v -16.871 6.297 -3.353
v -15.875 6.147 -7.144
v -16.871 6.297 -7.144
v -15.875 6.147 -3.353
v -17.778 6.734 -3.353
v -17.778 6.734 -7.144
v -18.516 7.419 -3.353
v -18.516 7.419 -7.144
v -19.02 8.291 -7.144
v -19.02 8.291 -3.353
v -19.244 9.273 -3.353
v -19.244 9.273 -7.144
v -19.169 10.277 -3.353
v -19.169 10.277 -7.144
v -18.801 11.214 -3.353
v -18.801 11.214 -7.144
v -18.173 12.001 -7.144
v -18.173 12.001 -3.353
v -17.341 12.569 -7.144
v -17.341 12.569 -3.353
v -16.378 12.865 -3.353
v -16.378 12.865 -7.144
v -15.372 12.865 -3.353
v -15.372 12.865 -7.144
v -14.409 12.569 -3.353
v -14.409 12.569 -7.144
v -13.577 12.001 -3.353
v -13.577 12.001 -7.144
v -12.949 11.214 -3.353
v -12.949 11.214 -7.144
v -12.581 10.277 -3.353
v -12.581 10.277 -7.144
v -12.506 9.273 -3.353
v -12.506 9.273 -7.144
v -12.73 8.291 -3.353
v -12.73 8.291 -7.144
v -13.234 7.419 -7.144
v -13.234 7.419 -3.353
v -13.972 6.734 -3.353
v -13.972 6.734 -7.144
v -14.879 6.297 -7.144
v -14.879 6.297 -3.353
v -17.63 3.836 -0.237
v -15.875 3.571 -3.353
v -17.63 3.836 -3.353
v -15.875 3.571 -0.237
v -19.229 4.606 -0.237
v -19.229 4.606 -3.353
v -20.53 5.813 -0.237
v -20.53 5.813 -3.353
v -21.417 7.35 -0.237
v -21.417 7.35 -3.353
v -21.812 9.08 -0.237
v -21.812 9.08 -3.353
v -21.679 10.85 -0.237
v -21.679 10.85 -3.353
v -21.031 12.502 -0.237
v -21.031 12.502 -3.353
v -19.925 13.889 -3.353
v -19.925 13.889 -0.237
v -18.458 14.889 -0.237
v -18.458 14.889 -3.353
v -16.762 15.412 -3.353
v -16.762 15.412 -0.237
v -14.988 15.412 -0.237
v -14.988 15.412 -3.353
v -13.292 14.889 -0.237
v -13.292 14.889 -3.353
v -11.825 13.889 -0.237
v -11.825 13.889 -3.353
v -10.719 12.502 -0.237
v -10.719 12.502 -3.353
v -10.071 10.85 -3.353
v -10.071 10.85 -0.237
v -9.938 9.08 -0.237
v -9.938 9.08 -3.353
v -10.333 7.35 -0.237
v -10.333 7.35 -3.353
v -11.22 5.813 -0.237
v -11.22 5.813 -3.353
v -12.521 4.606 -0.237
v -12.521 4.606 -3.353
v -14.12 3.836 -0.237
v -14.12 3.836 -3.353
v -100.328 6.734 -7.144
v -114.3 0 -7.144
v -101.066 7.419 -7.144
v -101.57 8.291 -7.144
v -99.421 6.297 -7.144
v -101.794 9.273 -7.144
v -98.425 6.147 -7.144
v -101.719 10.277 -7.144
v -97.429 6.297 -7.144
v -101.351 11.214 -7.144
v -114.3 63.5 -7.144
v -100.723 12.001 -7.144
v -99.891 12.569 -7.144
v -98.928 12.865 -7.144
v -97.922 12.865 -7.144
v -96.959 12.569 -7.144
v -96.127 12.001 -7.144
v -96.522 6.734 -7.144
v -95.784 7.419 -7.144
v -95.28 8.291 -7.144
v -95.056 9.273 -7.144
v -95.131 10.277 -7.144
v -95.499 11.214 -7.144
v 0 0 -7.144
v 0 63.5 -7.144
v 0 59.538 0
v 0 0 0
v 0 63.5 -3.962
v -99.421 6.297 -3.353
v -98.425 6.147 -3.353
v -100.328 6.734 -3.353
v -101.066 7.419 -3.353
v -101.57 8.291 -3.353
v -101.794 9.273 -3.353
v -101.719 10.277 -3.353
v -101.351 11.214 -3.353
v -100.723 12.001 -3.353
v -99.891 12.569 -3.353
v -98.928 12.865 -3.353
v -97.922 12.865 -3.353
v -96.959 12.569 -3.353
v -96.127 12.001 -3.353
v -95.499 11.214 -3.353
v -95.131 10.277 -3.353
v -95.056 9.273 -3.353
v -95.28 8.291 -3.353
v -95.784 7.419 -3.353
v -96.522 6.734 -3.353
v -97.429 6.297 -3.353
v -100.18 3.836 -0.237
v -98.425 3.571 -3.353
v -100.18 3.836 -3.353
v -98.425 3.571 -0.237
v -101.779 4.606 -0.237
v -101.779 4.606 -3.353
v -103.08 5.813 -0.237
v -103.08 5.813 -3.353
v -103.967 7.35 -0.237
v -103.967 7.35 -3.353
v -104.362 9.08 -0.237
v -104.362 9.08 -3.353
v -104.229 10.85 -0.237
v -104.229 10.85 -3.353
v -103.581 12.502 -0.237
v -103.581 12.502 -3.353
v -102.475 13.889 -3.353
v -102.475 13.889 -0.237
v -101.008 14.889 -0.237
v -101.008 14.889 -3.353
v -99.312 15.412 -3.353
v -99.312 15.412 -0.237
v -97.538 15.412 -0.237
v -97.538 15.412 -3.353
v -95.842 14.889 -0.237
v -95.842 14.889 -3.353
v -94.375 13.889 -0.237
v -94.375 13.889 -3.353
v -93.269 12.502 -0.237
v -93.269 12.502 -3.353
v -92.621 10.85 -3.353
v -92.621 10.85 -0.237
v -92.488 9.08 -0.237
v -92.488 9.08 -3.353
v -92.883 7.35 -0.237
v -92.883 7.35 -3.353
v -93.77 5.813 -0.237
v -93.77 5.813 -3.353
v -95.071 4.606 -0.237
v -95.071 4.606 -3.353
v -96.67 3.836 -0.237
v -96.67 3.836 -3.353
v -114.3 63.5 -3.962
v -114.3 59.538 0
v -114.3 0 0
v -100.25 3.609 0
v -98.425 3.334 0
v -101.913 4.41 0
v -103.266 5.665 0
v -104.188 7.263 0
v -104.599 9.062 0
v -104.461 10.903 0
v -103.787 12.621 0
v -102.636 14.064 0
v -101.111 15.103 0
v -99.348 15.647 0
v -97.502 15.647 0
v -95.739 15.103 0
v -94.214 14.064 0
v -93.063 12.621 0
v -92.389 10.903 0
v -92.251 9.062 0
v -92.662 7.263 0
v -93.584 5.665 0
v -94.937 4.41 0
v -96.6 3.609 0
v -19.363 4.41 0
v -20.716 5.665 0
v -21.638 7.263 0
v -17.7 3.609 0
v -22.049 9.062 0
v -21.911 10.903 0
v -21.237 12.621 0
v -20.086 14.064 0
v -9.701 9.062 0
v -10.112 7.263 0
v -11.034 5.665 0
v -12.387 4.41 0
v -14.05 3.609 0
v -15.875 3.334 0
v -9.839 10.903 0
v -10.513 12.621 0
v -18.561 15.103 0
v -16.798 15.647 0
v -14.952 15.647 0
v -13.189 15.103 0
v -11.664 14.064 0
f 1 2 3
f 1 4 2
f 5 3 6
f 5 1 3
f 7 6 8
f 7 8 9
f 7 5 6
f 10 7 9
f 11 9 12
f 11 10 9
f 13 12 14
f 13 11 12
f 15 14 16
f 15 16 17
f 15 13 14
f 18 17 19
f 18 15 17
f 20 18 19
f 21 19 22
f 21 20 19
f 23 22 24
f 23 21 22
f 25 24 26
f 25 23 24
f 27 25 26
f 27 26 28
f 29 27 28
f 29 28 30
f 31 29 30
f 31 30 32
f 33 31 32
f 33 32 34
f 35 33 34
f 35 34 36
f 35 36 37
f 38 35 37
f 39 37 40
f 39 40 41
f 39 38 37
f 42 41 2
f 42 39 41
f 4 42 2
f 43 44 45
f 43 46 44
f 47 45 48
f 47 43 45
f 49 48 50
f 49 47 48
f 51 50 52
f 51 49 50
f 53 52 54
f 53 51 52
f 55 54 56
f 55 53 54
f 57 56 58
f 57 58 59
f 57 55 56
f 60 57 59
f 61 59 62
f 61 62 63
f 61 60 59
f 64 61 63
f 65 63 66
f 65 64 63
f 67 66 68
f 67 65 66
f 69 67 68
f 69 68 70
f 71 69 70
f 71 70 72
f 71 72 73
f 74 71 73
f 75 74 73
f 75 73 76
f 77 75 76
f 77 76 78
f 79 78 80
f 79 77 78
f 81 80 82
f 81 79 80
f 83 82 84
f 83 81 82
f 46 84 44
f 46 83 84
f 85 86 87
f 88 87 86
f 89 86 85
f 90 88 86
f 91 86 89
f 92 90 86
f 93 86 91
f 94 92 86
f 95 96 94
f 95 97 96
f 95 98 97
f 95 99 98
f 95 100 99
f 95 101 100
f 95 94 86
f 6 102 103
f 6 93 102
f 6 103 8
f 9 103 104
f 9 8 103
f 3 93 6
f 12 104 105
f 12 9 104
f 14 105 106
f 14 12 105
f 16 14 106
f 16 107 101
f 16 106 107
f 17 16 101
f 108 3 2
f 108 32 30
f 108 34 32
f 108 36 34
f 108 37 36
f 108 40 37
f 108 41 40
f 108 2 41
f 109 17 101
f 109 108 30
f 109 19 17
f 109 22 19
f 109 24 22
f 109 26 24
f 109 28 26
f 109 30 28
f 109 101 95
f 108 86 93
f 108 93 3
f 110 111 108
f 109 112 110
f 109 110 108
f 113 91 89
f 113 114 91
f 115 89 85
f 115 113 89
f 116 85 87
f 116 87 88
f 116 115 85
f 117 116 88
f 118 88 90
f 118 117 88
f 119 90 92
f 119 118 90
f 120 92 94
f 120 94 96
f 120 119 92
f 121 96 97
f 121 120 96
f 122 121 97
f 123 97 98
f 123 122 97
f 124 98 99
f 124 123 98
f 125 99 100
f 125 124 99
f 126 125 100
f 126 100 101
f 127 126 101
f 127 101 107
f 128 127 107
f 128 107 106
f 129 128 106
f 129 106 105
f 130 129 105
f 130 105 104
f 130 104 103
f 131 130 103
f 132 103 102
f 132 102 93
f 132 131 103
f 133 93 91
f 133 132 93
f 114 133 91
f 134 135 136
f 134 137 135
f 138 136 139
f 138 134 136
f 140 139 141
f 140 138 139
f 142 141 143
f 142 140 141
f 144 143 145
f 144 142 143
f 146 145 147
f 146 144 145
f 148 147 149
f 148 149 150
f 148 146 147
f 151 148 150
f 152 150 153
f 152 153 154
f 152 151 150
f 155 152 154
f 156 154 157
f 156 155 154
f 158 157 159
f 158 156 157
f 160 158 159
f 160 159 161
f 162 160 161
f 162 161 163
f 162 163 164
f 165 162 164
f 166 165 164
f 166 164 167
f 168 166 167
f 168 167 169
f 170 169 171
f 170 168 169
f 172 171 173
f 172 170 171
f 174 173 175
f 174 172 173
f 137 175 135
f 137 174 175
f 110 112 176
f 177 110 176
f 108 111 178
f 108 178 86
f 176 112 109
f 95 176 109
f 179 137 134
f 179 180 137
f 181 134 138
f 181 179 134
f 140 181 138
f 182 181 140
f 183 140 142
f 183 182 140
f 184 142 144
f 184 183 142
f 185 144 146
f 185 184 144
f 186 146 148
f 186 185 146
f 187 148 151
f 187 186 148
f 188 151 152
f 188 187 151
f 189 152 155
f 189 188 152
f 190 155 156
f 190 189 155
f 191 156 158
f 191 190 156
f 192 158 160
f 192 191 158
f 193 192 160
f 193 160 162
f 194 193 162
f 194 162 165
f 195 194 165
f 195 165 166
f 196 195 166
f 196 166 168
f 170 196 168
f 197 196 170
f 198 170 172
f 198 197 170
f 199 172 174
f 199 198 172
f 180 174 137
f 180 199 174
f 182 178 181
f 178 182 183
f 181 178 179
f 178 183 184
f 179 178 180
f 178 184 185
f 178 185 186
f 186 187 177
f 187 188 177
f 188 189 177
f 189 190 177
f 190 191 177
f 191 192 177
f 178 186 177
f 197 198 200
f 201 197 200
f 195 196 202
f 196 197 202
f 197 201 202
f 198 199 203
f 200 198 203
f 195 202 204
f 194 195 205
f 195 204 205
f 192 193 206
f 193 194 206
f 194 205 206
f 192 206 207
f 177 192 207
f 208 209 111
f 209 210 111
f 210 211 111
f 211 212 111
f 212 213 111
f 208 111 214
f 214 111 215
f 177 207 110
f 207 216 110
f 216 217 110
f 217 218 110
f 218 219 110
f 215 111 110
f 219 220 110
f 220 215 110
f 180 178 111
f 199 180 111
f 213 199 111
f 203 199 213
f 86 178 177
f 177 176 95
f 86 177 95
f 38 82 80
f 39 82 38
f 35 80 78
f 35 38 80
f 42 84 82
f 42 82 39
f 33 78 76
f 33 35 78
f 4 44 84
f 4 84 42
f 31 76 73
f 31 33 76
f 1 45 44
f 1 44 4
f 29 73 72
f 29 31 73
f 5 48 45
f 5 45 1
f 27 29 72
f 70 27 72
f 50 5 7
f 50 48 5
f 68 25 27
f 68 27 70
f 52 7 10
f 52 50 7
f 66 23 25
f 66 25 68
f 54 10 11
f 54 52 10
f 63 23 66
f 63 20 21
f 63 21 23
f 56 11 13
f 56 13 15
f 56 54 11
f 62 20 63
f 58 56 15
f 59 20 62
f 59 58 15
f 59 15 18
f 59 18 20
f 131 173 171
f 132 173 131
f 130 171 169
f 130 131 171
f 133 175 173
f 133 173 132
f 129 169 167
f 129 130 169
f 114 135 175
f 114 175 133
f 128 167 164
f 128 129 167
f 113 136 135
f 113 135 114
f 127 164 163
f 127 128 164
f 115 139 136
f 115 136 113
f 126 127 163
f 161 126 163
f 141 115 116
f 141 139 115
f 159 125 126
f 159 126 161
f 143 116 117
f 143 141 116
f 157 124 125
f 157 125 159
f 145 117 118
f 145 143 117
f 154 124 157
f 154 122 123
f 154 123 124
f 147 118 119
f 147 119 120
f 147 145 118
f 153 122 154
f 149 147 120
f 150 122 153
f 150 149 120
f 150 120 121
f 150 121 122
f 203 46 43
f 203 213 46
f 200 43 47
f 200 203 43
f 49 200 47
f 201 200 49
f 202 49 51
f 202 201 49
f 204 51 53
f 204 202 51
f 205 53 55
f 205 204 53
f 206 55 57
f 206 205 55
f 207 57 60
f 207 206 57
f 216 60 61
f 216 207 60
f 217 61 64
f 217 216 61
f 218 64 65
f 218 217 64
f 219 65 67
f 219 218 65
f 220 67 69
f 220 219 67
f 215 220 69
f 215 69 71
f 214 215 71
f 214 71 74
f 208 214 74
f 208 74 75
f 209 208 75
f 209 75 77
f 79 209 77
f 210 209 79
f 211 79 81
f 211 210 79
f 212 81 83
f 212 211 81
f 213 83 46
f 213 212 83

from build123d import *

# Parameters (mm, degrees)
SKETCH2_W                                     = 7.14375
SKETCH2_H                                     = 63.5
BOSS_EXTRUDE1_DEPTH                           = 114.3
CBORE_FOR_1_4_BUTTON_HEAD_CAP_SCREW1_AT_COUNT = 2
CBORE_FOR_1_4_BUTTON_HEAD_CAP_SCREW1_AT_PITCH = 82.55
CHAMFER1_SIZE                                 = 3.9624


with BuildPart() as part:
    # Sketch2 → Boss-Extrude1 (new body)
    with BuildSketch(Plane(origin=(0, 0, 0), x_dir=(0, 0, -1), z_dir=(1, 0, 0))):
        with Locations((3.571875, 31.75)):
            Rectangle(SKETCH2_W, SKETCH2_H)
    extrude(amount=-BOSS_EXTRUDE1_DEPTH)

    # Sketch3 → CBORE for 1/4 Button Head Cap Screw1 (revolve, cut)
    with BuildSketch(Plane(origin=(-98.425, 9.525, 0), x_dir=(0, -1, 0), z_dir=(1, 0, 0))):
        Polygon((0, 0), (0, 7.14375), (3.3782, 7.14375), (3.3782, 3.3528), (5.95376, 3.3528), (5.95376, 0.23749), (6.19125, 0), align=None)
    cbore_for_1_4_button_head_cap_screw1 = revolve(axis=Axis((-98.425, 9.525, 6.35), (0, 0, -1)), mode=Mode.SUBTRACT)

    # CBORE for 1/4 Button Head Cap Screw1 at: CBORE for 1/4 Button Head Cap Screw1 ×2
    with Locations(*[(i * CBORE_FOR_1_4_BUTTON_HEAD_CAP_SCREW1_AT_PITCH, 0, 0) for i in range(1, CBORE_FOR_1_4_BUTTON_HEAD_CAP_SCREW1_AT_COUNT)]):
        add(cbore_for_1_4_button_head_cap_screw1, mode=Mode.SUBTRACT)

    # Chamfer1
    chamfer1_edges = [part.edges().sort_by_distance(p)[0] for p in [
        (-57.15, 63.5, 0),
    ]]
    chamfer(chamfer1_edges, length=CHAMFER1_SIZE)


solid = part.part
